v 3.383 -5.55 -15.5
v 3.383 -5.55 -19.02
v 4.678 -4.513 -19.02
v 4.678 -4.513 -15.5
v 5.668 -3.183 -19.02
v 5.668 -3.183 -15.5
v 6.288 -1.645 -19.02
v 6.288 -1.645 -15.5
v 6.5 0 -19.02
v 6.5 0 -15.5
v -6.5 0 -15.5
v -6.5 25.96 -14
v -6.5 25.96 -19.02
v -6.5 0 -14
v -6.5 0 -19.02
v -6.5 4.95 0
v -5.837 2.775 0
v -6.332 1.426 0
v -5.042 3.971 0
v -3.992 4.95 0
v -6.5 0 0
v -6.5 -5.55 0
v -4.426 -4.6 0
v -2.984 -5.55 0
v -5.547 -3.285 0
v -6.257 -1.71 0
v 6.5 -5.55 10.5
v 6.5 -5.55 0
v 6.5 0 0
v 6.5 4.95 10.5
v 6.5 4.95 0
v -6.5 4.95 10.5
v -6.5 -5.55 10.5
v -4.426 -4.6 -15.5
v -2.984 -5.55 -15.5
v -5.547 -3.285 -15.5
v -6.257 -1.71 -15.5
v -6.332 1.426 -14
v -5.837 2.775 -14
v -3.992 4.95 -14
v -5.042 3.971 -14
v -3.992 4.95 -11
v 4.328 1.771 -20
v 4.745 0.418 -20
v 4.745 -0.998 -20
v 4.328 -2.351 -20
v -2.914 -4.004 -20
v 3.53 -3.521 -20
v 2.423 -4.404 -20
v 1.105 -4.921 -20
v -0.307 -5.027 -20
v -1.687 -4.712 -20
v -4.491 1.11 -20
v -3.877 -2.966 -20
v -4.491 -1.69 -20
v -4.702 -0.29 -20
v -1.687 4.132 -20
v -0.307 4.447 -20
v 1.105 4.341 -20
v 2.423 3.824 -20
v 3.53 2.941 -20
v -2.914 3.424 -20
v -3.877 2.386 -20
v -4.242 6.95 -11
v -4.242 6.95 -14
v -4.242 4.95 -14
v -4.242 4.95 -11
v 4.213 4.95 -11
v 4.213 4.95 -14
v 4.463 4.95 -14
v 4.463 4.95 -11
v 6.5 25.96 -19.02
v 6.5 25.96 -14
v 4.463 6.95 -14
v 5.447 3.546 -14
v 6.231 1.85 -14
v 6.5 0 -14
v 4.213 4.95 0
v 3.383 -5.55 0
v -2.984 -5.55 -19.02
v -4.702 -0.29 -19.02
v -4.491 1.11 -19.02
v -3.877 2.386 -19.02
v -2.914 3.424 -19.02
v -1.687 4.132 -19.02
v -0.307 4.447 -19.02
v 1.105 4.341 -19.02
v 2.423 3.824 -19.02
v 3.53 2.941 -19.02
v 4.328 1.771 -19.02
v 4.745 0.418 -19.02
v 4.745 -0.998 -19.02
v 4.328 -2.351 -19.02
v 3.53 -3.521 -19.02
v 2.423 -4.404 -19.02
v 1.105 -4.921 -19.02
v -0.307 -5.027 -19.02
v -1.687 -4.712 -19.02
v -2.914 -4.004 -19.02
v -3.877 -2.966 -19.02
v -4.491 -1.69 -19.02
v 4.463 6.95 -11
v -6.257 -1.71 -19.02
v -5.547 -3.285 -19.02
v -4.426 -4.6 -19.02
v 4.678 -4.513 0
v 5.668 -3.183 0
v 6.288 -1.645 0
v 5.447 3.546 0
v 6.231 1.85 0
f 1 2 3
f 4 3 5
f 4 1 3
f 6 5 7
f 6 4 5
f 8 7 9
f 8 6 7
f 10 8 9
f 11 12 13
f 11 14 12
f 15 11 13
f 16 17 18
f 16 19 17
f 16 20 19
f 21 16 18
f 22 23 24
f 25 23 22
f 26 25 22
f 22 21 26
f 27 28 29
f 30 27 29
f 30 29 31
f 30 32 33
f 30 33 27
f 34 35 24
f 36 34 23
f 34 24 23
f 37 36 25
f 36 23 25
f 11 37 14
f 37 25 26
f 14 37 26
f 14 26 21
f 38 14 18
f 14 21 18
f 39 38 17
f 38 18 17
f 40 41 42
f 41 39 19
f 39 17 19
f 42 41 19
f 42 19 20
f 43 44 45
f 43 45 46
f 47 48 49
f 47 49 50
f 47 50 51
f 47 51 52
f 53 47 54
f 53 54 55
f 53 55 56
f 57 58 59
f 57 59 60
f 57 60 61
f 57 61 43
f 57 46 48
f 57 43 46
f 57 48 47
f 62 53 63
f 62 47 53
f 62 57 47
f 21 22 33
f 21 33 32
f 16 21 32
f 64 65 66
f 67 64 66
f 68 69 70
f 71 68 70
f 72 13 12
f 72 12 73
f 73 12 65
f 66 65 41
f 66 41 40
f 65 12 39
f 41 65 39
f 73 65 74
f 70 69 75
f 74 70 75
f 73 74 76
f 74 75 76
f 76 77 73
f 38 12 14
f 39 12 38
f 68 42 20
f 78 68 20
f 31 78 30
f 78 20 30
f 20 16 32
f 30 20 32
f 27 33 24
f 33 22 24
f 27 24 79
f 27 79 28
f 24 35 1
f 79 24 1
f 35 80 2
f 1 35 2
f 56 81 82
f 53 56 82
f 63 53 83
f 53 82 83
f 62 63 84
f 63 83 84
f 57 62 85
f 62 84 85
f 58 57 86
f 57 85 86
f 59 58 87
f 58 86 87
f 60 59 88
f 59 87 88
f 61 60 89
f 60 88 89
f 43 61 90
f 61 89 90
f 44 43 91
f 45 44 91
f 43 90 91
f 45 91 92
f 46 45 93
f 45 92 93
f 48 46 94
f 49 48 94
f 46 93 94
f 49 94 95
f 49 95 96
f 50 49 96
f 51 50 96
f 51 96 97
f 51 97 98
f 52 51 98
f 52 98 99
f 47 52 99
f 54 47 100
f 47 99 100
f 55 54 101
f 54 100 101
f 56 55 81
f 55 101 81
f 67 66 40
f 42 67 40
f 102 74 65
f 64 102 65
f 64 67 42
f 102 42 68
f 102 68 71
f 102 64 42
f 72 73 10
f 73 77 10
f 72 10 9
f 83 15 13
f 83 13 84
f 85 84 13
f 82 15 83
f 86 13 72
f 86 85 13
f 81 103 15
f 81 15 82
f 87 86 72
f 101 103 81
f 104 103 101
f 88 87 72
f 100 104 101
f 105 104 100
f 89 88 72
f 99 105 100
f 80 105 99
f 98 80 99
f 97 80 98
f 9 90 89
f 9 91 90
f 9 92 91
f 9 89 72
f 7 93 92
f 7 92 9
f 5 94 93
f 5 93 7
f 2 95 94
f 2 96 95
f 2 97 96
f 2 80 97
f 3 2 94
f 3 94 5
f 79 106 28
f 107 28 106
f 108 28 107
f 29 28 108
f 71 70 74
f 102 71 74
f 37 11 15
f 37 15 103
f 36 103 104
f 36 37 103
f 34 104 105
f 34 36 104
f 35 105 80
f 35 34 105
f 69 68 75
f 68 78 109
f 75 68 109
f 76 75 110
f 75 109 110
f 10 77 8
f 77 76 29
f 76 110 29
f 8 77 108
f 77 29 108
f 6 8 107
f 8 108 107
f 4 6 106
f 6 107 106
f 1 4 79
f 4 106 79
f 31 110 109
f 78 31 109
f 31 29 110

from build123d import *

# Parameters (mm, degrees)
SKETCH2_W            = 13
SKETCH2_H            = 11.1
SKETCH2_W_2          = 12.5
SKETCH2_H_2          = 10.6
BOSS_EXTRUDE1_DEPTH  = 10
SKETCH3_W            = 12.5
SKETCH3_H            = 10.6
BOSS_EXTRUDE2_DEPTH  = 10
BOSS_EXTRUDE3_DEPTH  = 15.5
BOSS_EXTRUDE4_DEPTH  = 1.5
BOSS_EXTRUDE5_DEPTH  = 3.52
SKETCH9_W            = 13
SKETCH9_H            = 11.1
BOSS_EXTRUDE7_DEPTH  = 0.5
SKETCH10_W           = 24.5
SKETCH10_H           = 0.6
CUT_EXTRUDE1_DEPTH   = 15
BOSS_EXTRUDE8_DEPTH  = 3
SKETCH13_R           = 4.75
BOSS_EXTRUDE9_DEPTH  = 0.98
SKETCH15_W           = 13
SKETCH15_H           = 5.02
BOSS_EXTRUDE11_DEPTH = 15


with BuildPart() as part:
    # Sketch2 → Boss-Extrude1 (new body)
    with BuildSketch(Plane.XY):
        Rectangle(SKETCH2_W, SKETCH2_H)
        Rectangle(SKETCH2_W_2, SKETCH2_H_2, mode=Mode.SUBTRACT)
    extrude(amount=BOSS_EXTRUDE1_DEPTH)

    # Sketch3 → Boss-Extrude2 (add)
    with BuildSketch(Plane(origin=(0, 0, 0), x_dir=(-1, 0, 0), z_dir=(0, 0, -1))):
        Rectangle(SKETCH3_W, SKETCH3_H)
    extrude(amount=-BOSS_EXTRUDE2_DEPTH)

    # Sketch4 → Boss-Extrude3 (add)
    with BuildSketch(Plane(origin=(0, 0, 0), x_dir=(-1, 0, 0), z_dir=(0, 0, -1))):
        with BuildLine():
            Line((-3.383415434, -5.55), (2.983923173, -5.55))
            ThreePointArc((2.983923173, -5.55), (6.5, 0), (2.983923173, 5.55))
            Line((2.983923173, 5.55), (-3.383415434, 5.55))
            ThreePointArc((-3.383415434, 5.55), (-6.5, 0), (-3.383415434, -5.55))
        make_face()
    extrude(amount=BOSS_EXTRUDE3_DEPTH)

    # Sketch5 → Boss-Extrude4 (add)
    with BuildSketch(Plane(origin=(0, 0, -15.5), x_dir=(-1, 0, 0), z_dir=(0, 0, -1))):
        with BuildLine():
            Line((6.5, 0), (-6.5, 0))
            ThreePointArc((-6.5, 0), (-5.667547985, -3.182593257), (-3.383415434, -5.55))
            Line((-3.383415434, -5.55), (2.983923173, -5.55))
            ThreePointArc((2.983923173, -5.55), (5.547001926, -3.285015078), (6.5, 0))
        make_face()
        with BuildLine():
            Line((6.5, 10.96), (-6.5, 10.96))
            Line((-6.5, 10.96), (-6.5, 0))
            ThreePointArc((-6.5, 0), (-5.667547985, 3.182593257), (-3.383415434, 5.55))
            Line((-3.383415434, 5.55), (2.983923173, 5.55))
            ThreePointArc((2.983923173, 5.55), (5.547001926, 3.285015078), (6.5, 0))
            Line((6.5, 0), (6.5, 10.96))
        make_face()
    extrude(amount=-BOSS_EXTRUDE4_DEPTH)

    # Sketch6 → Boss-Extrude5 (add)
    with BuildSketch(Plane(origin=(0, 0, -15.5), x_dir=(-1, 0, 0), z_dir=(0, 0, -1))):
        with BuildLine():
            Line((-6.5, 0), (-6.5, 10.96))
            Line((-6.5, 10.96), (6.5, 10.96))
            Line((6.5, 10.96), (6.5, 0))
            ThreePointArc((6.5, 0), (5.547001926, -3.285015078), (2.983923173, -5.55))
            Line((2.983923173, -5.55), (-3.383415434, -5.55))
            ThreePointArc((-3.383415434, -5.55), (-5.667547985, -3.182593257), (-6.5, 0))
        make_face()
    extrude(amount=BOSS_EXTRUDE5_DEPTH)

    # Sketch9 → Boss-Extrude7 (add)
    with BuildSketch(Plane.XY.offset(10)):
        Rectangle(SKETCH9_W, SKETCH9_H)
    extrude(amount=BOSS_EXTRUDE7_DEPTH)

    # Sketch10 → Cut-Extrude1 (cut)
    with BuildSketch(Plane.ZY.offset(6.5)):
        with Locations((-1.75, 5.25)):
            Rectangle(SKETCH10_W, SKETCH10_H)
    extrude(amount=-CUT_EXTRUDE1_DEPTH, mode=Mode.SUBTRACT)

    # Sketch11 → Boss-Extrude8 (add)
    with BuildSketch(Plane.XY.offset(-14)):
        Polygon((-3.991590331, 4.95), (0.110593925, 4.95), (0.110593925, 6.95), (-4.241590331, 6.95), (-4.241590331, 4.95), align=None)
        Polygon((4.212778181, 4.95), (4.462778181, 4.95), (4.462778181, 6.95), (0.110593925, 6.95), (0.110593925, 4.95), align=None)
    extrude(amount=BOSS_EXTRUDE8_DEPTH)

    # Sketch13 → Boss-Extrude9 (add)
    with BuildSketch(Plane(origin=(0, 0, -19.02), x_dir=(-1, 0, 0), z_dir=(0, 0, -1))):
        with Locations((-0.048060538, -0.29)):
            Circle(SKETCH13_R)
    extrude(amount=BOSS_EXTRUDE9_DEPTH)

    # Sketch15 → Boss-Extrude11 (add)
    with BuildSketch(Plane(origin=(0, 10.96, 0), x_dir=(1, 0, 0), z_dir=(0, 1, 0))):
        with Locations((0, 16.51)):
            Rectangle(SKETCH15_W, SKETCH15_H)
    extrude(amount=BOSS_EXTRUDE11_DEPTH)


solid = part.part
